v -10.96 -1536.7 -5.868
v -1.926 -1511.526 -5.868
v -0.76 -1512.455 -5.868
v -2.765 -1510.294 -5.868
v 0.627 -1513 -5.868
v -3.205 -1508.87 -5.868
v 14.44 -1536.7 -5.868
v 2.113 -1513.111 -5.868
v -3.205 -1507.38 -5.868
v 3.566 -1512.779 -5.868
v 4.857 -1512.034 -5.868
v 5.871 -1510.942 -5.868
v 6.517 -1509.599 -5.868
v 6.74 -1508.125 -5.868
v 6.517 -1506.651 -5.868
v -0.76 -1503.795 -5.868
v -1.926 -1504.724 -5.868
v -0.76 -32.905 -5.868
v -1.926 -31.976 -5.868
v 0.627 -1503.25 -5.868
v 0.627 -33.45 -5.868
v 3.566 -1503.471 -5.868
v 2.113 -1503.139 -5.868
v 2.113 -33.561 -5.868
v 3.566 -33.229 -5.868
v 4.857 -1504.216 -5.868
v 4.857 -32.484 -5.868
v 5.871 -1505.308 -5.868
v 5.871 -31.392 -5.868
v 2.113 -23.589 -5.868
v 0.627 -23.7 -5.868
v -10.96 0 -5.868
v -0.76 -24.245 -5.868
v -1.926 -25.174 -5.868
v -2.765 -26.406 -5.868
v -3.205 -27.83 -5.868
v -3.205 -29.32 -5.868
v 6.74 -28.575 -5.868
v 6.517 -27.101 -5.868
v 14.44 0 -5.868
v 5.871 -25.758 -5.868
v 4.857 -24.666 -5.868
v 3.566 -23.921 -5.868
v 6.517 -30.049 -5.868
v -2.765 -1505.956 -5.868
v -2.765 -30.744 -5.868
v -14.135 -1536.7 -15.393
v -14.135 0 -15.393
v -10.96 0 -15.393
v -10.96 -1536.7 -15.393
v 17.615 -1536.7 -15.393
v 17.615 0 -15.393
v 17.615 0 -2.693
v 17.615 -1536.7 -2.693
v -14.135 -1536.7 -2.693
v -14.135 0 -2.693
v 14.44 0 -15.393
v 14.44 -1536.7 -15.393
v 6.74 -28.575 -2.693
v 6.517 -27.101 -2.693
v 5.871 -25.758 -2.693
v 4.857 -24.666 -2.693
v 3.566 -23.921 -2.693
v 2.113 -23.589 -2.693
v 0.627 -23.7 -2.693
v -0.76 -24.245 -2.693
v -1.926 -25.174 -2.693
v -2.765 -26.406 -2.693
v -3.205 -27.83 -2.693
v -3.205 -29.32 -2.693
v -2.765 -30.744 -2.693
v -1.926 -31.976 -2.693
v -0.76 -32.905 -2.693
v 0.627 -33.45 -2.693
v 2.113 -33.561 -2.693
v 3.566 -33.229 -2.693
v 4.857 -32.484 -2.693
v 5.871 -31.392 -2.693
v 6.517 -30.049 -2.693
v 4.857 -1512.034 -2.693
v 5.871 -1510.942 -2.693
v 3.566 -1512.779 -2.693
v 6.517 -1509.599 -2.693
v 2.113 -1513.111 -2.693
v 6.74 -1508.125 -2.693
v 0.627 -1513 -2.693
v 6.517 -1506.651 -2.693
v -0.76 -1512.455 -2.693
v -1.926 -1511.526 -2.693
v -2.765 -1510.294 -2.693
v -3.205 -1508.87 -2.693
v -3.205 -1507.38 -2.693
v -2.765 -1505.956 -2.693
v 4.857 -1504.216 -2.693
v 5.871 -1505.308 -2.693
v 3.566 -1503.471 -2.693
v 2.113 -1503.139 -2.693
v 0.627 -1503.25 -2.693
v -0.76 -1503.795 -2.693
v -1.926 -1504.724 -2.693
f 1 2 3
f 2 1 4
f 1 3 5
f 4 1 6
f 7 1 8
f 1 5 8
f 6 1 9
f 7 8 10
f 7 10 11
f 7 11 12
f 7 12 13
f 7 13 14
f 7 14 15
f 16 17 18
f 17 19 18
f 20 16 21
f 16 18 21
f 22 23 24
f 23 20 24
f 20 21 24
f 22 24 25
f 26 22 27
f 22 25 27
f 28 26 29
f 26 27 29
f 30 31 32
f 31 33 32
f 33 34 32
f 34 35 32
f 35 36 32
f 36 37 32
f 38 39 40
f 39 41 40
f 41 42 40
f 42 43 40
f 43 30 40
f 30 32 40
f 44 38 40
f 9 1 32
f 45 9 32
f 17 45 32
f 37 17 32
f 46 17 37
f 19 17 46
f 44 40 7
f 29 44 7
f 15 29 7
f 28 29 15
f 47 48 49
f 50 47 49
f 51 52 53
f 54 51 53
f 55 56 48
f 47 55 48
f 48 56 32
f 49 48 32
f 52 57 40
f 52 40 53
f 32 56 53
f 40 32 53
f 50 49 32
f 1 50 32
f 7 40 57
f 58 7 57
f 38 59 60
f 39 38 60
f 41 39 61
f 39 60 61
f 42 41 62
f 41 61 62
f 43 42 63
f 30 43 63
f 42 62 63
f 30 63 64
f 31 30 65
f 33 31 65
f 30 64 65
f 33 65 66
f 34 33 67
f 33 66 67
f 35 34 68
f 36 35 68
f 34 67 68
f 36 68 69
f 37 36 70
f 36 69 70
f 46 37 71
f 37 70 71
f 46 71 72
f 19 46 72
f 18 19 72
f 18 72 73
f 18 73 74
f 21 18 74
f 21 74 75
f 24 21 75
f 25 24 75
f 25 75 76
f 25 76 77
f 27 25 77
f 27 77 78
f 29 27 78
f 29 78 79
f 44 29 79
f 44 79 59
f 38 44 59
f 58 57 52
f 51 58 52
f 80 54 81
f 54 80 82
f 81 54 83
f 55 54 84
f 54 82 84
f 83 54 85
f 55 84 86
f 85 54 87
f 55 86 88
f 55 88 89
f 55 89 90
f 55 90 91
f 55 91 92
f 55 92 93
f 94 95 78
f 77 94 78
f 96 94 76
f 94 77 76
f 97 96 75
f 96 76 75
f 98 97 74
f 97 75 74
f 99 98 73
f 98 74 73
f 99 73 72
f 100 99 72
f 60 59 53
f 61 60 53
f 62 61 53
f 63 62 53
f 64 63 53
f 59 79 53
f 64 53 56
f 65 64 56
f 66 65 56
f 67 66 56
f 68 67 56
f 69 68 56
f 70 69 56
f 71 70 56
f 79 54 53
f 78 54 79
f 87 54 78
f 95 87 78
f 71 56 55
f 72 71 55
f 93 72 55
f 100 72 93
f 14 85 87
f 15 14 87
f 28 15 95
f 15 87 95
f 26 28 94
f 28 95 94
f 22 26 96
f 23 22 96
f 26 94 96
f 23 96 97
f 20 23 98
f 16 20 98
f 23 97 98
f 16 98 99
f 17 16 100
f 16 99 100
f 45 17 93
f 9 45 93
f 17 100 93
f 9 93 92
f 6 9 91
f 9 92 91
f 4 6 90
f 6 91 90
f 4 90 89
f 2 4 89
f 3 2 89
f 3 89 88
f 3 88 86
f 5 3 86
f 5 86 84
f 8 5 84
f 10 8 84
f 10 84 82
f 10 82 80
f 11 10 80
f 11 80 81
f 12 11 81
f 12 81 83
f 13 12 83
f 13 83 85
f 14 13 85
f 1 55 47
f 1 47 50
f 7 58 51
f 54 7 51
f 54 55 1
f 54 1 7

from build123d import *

# Parameters (mm, degrees)
F1_DEPTH = 1536.7
F2_R     = 5
F3_DEPTH = 25.4


with BuildPart() as f1:
    # F0 (on Front) → F1 (new body)
    with BuildSketch(Plane.XZ):
        Polygon((17.614564, -2.693408), (-14.135436, -2.693408), (-14.135436, -15.393408), (-10.960436, -15.393408), (-10.960436, -5.868408), (14.439564, -5.868408), (14.439564, -15.393408), (17.614564, -15.393408), align=None)
    extrude(amount=F1_DEPTH)

    # F2 (on face) → F3 (cut)
    with BuildSketch(Plane.XY.offset(-2.693408)):
        with Locations((1.739564, -1508.125)):
            Circle(F2_R)
        with Locations((1.739564, -28.575)):
            Circle(F2_R)
    extrude(amount=-F3_DEPTH, mode=Mode.SUBTRACT)


solid = f1.part
